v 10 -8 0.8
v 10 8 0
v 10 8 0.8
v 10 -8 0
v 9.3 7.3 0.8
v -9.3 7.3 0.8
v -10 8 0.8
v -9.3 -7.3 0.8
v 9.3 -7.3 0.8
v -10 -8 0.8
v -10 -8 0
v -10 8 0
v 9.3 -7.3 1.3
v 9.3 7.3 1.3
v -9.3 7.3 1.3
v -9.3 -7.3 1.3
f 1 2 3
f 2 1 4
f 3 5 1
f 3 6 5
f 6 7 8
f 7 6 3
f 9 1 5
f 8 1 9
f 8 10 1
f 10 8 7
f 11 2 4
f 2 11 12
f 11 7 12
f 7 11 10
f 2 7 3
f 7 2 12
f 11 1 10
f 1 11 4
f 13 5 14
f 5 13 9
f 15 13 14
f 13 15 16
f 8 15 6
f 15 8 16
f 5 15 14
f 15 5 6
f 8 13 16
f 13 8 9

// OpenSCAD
// ============================================================
// Ancient Chinese City - shared parameters and primitive helpers
// ============================================================

function city_w() = 260;
function city_h() = 190;

function wall_t() = 14;
function wall_h() = 15;
function parapet_h() = 2.4;

function gate_w() = 28;

function main_road_w() = 9;
function side_road_w() = 5;

function c_ground()     = [0.60, 0.73, 0.48];
function c_road()       = [0.60, 0.54, 0.42];
function c_stone()      = [0.53, 0.50, 0.45];
function c_stone_dark() = [0.36, 0.34, 0.31];
function c_stone_lite() = [0.70, 0.66, 0.58];
function c_walkway()    = [0.64, 0.61, 0.54];

function c_wood()       = [0.42, 0.22, 0.10];
function c_wood_dark()  = [0.22, 0.11, 0.05];
function c_plaster()    = [0.84, 0.79, 0.67];

function c_roof()       = [0.55, 0.10, 0.06];
function c_roof_dark()  = [0.26, 0.06, 0.035];

function c_lantern()    = [0.86, 0.16, 0.08];
function c_flag()       = [0.72, 0.08, 0.06];
function c_green()      = [0.18, 0.42, 0.14];
function c_water()      = [0.28, 0.46, 0.60];

module boxc(s) {
    cube(s, center=true);
}

module stepped_base(L=20, D=16, H1=0.8, H2=0.5) {
    color(c_stone_dark())
    translate([0,0,H1/2])
    boxc([L,D,H1]);

    color(c_stone_lite())
    translate([0,0,H1+H2/2])
    boxc([L-1.4,D-1.4,H2]);
}

// Standalone preview.
stepped_base();
